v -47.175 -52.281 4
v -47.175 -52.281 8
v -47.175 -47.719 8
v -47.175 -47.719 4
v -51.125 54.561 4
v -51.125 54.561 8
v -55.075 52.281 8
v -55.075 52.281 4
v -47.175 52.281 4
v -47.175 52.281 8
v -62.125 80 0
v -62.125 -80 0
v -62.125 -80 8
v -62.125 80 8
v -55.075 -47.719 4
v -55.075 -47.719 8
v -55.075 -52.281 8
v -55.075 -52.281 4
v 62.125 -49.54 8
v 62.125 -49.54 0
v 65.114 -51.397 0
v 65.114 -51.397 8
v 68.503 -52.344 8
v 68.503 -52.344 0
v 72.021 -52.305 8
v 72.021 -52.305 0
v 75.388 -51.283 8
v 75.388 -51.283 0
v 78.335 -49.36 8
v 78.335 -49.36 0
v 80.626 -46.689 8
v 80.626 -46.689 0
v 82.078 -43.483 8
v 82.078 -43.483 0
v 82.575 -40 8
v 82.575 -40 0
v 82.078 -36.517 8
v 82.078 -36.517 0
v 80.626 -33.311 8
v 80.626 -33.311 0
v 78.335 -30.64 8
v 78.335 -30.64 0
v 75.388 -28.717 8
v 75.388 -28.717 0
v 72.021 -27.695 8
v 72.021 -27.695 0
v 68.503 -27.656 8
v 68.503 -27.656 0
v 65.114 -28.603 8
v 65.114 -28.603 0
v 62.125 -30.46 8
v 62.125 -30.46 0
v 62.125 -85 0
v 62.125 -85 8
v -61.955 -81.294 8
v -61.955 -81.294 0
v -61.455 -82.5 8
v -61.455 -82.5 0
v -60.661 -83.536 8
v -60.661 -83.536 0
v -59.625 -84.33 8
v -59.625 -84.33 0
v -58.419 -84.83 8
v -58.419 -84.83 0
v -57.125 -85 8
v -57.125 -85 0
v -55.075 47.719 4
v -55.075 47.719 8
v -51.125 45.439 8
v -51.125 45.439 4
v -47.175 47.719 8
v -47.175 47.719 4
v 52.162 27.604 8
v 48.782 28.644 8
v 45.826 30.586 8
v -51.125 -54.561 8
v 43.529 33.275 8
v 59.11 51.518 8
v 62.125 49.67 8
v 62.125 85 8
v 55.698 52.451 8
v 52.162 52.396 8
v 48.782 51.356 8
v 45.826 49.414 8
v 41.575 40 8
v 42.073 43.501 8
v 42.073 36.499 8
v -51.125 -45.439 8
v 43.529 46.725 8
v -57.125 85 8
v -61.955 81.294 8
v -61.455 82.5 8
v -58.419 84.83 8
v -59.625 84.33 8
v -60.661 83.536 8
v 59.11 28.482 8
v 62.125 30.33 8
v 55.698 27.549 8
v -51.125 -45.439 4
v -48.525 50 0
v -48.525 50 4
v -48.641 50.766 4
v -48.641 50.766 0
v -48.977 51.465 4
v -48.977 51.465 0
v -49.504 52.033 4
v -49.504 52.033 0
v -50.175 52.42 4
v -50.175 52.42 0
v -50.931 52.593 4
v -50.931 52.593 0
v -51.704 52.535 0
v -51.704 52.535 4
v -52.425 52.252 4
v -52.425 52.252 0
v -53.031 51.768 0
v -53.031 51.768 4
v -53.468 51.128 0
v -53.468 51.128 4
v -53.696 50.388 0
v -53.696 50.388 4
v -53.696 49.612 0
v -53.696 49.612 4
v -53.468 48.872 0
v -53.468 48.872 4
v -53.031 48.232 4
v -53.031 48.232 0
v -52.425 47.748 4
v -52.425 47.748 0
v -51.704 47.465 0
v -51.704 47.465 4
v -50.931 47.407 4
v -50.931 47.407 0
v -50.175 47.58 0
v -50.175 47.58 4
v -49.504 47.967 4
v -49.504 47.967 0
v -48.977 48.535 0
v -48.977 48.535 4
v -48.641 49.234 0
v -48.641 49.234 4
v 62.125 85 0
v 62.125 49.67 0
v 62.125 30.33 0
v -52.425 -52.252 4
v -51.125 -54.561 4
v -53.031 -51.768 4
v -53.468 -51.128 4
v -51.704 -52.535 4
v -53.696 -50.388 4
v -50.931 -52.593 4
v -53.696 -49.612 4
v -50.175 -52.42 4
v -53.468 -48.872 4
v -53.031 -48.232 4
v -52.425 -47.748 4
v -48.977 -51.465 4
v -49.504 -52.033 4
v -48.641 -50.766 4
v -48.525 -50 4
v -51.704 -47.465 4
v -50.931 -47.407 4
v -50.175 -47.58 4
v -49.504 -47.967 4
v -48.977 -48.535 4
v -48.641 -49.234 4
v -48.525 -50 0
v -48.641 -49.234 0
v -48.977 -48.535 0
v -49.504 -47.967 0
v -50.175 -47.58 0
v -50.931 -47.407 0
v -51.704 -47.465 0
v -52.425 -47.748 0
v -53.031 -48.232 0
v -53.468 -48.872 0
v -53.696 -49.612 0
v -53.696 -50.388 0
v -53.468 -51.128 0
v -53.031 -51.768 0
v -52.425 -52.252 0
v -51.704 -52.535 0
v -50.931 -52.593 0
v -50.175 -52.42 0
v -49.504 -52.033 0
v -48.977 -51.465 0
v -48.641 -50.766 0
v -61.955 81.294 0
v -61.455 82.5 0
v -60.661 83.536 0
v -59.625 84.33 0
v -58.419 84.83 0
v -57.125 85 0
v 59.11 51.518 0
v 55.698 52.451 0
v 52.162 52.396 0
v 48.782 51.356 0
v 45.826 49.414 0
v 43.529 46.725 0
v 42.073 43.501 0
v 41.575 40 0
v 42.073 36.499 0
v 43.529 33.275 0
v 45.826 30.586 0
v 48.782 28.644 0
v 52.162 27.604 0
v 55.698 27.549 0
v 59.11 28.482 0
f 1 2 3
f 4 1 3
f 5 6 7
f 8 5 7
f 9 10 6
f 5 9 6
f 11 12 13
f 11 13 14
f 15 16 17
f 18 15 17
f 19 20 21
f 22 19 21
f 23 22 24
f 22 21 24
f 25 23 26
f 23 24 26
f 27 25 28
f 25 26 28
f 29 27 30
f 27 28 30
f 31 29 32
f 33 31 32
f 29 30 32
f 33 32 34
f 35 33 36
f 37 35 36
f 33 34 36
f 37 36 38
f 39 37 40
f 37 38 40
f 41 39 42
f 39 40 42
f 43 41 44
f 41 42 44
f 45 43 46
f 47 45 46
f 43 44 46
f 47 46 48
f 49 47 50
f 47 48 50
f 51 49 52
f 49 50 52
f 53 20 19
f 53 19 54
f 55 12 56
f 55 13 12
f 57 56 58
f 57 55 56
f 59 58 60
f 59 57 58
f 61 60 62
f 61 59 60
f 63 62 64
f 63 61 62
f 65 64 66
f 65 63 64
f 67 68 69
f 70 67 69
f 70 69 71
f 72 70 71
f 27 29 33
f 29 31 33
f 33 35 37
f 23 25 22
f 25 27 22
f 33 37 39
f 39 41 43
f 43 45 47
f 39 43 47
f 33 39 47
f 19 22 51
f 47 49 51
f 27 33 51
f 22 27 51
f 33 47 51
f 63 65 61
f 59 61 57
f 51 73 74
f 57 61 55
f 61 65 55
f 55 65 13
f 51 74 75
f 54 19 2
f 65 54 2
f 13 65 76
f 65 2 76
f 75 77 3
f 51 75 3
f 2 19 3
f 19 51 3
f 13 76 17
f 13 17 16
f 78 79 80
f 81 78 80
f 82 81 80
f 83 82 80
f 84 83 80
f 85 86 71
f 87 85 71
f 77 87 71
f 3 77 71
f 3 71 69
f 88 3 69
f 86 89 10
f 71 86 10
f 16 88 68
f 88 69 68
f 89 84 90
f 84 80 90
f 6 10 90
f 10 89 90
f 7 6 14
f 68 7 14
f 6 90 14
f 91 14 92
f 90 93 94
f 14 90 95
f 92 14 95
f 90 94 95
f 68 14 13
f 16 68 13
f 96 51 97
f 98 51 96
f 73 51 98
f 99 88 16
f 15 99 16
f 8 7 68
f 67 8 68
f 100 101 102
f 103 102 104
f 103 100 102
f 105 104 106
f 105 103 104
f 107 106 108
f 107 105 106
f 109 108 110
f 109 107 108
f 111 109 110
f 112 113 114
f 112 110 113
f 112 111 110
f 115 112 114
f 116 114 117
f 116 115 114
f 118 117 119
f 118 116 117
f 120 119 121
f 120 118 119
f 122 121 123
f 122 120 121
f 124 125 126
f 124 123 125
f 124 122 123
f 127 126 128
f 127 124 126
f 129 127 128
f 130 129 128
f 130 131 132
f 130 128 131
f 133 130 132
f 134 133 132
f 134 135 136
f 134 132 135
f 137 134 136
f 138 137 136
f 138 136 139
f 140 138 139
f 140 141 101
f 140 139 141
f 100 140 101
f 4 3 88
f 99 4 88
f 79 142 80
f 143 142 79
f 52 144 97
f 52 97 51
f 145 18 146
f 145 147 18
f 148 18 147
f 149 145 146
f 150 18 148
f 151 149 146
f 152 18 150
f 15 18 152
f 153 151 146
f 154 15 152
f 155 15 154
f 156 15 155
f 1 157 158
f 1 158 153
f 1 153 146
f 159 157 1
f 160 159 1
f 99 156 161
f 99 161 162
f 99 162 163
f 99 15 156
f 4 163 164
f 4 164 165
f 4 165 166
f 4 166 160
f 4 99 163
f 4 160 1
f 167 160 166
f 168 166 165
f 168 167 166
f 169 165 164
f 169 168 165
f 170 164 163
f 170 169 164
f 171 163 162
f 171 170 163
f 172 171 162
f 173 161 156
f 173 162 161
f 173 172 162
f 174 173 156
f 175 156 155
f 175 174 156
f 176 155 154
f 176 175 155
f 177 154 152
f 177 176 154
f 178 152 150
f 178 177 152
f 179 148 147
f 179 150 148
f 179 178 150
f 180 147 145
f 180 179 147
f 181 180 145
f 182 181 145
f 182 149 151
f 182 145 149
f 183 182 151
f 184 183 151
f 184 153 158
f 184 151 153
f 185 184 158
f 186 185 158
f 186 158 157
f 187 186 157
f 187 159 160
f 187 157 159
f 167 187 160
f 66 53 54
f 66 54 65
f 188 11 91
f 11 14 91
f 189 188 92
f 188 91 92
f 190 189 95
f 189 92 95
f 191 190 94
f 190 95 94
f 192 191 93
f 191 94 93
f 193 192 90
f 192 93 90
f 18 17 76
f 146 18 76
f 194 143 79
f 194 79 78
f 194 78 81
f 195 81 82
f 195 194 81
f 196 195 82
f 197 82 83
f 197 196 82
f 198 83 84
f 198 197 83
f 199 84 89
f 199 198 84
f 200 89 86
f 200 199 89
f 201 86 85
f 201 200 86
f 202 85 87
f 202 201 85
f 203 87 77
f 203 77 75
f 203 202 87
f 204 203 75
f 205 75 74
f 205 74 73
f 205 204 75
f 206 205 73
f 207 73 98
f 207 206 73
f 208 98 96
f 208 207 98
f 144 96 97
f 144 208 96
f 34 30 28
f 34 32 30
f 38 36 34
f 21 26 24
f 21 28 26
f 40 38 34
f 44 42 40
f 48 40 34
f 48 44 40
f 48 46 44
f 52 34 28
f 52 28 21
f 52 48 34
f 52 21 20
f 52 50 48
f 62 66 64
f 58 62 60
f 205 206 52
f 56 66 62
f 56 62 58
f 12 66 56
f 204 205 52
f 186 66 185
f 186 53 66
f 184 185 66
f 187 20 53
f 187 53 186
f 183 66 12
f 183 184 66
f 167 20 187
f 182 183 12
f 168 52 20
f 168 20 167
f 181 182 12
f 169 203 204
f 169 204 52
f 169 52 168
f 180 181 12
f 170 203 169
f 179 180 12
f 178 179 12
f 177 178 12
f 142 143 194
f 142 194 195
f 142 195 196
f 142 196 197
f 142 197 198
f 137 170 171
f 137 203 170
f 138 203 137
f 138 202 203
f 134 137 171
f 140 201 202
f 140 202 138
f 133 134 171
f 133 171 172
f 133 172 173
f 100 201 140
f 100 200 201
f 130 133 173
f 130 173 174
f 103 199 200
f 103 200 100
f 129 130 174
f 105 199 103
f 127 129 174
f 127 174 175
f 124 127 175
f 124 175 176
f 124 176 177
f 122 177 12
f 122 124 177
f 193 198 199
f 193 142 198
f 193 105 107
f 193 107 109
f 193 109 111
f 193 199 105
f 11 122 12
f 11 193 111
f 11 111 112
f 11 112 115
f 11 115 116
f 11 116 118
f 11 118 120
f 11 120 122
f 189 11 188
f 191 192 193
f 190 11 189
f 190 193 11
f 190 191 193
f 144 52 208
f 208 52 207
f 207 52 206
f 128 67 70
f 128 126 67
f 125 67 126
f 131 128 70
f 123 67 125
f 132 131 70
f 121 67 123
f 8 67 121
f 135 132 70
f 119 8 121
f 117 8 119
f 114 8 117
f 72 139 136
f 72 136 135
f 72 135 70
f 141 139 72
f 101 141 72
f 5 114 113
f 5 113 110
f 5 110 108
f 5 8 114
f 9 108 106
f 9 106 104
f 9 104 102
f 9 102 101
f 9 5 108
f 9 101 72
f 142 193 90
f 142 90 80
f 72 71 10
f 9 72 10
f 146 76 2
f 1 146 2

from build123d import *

# Parameters (mm, degrees)
SKETCH_R     = 2.6
PAD_DEPTH    = 8
FILLET_R     = 5
POCKET_DEPTH = 4


with BuildPart() as part:
    # Sketch → Pad (new body)
    with BuildSketch(Plane.XY):
        with BuildLine():
            Line((-62.125, -85), (-62.125, 85))
            Line((-62.125, 85), (62.125, 85))
            Line((62.125, 85), (62.125, 49.669669))
            ThreePointArc((62.125, 49.669669), (41.575, 40), (62.125, 30.330331))
            Line((62.125, 30.330331), (62.125, -30.460477))
            ThreePointArc((62.125, -49.539523), (82.575, -40), (62.125, -30.460477))
            Line((62.125, -49.539523), (62.125, -85))
            Line((62.125, -85), (-62.125, -85))
        make_face()
        with Locations((-51.125, 50)):
            Circle(SKETCH_R, mode=Mode.SUBTRACT)
        with Locations((-51.125, -50)):
            Circle(SKETCH_R, mode=Mode.SUBTRACT)
    extrude(amount=PAD_DEPTH)

    # Fillet
    fillet_edges = [part.edges().sort_by_distance(p)[0] for p in [
        (-62.125, 85, 4),
        (-62.125, -85, 4),
    ]]
    fillet(fillet_edges, radius=FILLET_R)

    # Sketch001 (on Face5 of Fillet) → Pocket (cut)
    with BuildSketch(Plane.XY.offset(8)):
        Polygon((-47.175, 52.280534), (-51.125, 54.561067), (-55.075, 52.280534), (-55.075, 47.719466), (-51.125, 45.438933), (-47.175, 47.719466), align=None)
        Polygon((-47.175, -47.719466), (-51.125, -45.438933), (-55.075, -47.719466), (-55.075, -52.280534), (-51.125, -54.561067), (-47.175, -52.280534), align=None)
    extrude(amount=-POCKET_DEPTH, mode=Mode.SUBTRACT)


solid = part.part
